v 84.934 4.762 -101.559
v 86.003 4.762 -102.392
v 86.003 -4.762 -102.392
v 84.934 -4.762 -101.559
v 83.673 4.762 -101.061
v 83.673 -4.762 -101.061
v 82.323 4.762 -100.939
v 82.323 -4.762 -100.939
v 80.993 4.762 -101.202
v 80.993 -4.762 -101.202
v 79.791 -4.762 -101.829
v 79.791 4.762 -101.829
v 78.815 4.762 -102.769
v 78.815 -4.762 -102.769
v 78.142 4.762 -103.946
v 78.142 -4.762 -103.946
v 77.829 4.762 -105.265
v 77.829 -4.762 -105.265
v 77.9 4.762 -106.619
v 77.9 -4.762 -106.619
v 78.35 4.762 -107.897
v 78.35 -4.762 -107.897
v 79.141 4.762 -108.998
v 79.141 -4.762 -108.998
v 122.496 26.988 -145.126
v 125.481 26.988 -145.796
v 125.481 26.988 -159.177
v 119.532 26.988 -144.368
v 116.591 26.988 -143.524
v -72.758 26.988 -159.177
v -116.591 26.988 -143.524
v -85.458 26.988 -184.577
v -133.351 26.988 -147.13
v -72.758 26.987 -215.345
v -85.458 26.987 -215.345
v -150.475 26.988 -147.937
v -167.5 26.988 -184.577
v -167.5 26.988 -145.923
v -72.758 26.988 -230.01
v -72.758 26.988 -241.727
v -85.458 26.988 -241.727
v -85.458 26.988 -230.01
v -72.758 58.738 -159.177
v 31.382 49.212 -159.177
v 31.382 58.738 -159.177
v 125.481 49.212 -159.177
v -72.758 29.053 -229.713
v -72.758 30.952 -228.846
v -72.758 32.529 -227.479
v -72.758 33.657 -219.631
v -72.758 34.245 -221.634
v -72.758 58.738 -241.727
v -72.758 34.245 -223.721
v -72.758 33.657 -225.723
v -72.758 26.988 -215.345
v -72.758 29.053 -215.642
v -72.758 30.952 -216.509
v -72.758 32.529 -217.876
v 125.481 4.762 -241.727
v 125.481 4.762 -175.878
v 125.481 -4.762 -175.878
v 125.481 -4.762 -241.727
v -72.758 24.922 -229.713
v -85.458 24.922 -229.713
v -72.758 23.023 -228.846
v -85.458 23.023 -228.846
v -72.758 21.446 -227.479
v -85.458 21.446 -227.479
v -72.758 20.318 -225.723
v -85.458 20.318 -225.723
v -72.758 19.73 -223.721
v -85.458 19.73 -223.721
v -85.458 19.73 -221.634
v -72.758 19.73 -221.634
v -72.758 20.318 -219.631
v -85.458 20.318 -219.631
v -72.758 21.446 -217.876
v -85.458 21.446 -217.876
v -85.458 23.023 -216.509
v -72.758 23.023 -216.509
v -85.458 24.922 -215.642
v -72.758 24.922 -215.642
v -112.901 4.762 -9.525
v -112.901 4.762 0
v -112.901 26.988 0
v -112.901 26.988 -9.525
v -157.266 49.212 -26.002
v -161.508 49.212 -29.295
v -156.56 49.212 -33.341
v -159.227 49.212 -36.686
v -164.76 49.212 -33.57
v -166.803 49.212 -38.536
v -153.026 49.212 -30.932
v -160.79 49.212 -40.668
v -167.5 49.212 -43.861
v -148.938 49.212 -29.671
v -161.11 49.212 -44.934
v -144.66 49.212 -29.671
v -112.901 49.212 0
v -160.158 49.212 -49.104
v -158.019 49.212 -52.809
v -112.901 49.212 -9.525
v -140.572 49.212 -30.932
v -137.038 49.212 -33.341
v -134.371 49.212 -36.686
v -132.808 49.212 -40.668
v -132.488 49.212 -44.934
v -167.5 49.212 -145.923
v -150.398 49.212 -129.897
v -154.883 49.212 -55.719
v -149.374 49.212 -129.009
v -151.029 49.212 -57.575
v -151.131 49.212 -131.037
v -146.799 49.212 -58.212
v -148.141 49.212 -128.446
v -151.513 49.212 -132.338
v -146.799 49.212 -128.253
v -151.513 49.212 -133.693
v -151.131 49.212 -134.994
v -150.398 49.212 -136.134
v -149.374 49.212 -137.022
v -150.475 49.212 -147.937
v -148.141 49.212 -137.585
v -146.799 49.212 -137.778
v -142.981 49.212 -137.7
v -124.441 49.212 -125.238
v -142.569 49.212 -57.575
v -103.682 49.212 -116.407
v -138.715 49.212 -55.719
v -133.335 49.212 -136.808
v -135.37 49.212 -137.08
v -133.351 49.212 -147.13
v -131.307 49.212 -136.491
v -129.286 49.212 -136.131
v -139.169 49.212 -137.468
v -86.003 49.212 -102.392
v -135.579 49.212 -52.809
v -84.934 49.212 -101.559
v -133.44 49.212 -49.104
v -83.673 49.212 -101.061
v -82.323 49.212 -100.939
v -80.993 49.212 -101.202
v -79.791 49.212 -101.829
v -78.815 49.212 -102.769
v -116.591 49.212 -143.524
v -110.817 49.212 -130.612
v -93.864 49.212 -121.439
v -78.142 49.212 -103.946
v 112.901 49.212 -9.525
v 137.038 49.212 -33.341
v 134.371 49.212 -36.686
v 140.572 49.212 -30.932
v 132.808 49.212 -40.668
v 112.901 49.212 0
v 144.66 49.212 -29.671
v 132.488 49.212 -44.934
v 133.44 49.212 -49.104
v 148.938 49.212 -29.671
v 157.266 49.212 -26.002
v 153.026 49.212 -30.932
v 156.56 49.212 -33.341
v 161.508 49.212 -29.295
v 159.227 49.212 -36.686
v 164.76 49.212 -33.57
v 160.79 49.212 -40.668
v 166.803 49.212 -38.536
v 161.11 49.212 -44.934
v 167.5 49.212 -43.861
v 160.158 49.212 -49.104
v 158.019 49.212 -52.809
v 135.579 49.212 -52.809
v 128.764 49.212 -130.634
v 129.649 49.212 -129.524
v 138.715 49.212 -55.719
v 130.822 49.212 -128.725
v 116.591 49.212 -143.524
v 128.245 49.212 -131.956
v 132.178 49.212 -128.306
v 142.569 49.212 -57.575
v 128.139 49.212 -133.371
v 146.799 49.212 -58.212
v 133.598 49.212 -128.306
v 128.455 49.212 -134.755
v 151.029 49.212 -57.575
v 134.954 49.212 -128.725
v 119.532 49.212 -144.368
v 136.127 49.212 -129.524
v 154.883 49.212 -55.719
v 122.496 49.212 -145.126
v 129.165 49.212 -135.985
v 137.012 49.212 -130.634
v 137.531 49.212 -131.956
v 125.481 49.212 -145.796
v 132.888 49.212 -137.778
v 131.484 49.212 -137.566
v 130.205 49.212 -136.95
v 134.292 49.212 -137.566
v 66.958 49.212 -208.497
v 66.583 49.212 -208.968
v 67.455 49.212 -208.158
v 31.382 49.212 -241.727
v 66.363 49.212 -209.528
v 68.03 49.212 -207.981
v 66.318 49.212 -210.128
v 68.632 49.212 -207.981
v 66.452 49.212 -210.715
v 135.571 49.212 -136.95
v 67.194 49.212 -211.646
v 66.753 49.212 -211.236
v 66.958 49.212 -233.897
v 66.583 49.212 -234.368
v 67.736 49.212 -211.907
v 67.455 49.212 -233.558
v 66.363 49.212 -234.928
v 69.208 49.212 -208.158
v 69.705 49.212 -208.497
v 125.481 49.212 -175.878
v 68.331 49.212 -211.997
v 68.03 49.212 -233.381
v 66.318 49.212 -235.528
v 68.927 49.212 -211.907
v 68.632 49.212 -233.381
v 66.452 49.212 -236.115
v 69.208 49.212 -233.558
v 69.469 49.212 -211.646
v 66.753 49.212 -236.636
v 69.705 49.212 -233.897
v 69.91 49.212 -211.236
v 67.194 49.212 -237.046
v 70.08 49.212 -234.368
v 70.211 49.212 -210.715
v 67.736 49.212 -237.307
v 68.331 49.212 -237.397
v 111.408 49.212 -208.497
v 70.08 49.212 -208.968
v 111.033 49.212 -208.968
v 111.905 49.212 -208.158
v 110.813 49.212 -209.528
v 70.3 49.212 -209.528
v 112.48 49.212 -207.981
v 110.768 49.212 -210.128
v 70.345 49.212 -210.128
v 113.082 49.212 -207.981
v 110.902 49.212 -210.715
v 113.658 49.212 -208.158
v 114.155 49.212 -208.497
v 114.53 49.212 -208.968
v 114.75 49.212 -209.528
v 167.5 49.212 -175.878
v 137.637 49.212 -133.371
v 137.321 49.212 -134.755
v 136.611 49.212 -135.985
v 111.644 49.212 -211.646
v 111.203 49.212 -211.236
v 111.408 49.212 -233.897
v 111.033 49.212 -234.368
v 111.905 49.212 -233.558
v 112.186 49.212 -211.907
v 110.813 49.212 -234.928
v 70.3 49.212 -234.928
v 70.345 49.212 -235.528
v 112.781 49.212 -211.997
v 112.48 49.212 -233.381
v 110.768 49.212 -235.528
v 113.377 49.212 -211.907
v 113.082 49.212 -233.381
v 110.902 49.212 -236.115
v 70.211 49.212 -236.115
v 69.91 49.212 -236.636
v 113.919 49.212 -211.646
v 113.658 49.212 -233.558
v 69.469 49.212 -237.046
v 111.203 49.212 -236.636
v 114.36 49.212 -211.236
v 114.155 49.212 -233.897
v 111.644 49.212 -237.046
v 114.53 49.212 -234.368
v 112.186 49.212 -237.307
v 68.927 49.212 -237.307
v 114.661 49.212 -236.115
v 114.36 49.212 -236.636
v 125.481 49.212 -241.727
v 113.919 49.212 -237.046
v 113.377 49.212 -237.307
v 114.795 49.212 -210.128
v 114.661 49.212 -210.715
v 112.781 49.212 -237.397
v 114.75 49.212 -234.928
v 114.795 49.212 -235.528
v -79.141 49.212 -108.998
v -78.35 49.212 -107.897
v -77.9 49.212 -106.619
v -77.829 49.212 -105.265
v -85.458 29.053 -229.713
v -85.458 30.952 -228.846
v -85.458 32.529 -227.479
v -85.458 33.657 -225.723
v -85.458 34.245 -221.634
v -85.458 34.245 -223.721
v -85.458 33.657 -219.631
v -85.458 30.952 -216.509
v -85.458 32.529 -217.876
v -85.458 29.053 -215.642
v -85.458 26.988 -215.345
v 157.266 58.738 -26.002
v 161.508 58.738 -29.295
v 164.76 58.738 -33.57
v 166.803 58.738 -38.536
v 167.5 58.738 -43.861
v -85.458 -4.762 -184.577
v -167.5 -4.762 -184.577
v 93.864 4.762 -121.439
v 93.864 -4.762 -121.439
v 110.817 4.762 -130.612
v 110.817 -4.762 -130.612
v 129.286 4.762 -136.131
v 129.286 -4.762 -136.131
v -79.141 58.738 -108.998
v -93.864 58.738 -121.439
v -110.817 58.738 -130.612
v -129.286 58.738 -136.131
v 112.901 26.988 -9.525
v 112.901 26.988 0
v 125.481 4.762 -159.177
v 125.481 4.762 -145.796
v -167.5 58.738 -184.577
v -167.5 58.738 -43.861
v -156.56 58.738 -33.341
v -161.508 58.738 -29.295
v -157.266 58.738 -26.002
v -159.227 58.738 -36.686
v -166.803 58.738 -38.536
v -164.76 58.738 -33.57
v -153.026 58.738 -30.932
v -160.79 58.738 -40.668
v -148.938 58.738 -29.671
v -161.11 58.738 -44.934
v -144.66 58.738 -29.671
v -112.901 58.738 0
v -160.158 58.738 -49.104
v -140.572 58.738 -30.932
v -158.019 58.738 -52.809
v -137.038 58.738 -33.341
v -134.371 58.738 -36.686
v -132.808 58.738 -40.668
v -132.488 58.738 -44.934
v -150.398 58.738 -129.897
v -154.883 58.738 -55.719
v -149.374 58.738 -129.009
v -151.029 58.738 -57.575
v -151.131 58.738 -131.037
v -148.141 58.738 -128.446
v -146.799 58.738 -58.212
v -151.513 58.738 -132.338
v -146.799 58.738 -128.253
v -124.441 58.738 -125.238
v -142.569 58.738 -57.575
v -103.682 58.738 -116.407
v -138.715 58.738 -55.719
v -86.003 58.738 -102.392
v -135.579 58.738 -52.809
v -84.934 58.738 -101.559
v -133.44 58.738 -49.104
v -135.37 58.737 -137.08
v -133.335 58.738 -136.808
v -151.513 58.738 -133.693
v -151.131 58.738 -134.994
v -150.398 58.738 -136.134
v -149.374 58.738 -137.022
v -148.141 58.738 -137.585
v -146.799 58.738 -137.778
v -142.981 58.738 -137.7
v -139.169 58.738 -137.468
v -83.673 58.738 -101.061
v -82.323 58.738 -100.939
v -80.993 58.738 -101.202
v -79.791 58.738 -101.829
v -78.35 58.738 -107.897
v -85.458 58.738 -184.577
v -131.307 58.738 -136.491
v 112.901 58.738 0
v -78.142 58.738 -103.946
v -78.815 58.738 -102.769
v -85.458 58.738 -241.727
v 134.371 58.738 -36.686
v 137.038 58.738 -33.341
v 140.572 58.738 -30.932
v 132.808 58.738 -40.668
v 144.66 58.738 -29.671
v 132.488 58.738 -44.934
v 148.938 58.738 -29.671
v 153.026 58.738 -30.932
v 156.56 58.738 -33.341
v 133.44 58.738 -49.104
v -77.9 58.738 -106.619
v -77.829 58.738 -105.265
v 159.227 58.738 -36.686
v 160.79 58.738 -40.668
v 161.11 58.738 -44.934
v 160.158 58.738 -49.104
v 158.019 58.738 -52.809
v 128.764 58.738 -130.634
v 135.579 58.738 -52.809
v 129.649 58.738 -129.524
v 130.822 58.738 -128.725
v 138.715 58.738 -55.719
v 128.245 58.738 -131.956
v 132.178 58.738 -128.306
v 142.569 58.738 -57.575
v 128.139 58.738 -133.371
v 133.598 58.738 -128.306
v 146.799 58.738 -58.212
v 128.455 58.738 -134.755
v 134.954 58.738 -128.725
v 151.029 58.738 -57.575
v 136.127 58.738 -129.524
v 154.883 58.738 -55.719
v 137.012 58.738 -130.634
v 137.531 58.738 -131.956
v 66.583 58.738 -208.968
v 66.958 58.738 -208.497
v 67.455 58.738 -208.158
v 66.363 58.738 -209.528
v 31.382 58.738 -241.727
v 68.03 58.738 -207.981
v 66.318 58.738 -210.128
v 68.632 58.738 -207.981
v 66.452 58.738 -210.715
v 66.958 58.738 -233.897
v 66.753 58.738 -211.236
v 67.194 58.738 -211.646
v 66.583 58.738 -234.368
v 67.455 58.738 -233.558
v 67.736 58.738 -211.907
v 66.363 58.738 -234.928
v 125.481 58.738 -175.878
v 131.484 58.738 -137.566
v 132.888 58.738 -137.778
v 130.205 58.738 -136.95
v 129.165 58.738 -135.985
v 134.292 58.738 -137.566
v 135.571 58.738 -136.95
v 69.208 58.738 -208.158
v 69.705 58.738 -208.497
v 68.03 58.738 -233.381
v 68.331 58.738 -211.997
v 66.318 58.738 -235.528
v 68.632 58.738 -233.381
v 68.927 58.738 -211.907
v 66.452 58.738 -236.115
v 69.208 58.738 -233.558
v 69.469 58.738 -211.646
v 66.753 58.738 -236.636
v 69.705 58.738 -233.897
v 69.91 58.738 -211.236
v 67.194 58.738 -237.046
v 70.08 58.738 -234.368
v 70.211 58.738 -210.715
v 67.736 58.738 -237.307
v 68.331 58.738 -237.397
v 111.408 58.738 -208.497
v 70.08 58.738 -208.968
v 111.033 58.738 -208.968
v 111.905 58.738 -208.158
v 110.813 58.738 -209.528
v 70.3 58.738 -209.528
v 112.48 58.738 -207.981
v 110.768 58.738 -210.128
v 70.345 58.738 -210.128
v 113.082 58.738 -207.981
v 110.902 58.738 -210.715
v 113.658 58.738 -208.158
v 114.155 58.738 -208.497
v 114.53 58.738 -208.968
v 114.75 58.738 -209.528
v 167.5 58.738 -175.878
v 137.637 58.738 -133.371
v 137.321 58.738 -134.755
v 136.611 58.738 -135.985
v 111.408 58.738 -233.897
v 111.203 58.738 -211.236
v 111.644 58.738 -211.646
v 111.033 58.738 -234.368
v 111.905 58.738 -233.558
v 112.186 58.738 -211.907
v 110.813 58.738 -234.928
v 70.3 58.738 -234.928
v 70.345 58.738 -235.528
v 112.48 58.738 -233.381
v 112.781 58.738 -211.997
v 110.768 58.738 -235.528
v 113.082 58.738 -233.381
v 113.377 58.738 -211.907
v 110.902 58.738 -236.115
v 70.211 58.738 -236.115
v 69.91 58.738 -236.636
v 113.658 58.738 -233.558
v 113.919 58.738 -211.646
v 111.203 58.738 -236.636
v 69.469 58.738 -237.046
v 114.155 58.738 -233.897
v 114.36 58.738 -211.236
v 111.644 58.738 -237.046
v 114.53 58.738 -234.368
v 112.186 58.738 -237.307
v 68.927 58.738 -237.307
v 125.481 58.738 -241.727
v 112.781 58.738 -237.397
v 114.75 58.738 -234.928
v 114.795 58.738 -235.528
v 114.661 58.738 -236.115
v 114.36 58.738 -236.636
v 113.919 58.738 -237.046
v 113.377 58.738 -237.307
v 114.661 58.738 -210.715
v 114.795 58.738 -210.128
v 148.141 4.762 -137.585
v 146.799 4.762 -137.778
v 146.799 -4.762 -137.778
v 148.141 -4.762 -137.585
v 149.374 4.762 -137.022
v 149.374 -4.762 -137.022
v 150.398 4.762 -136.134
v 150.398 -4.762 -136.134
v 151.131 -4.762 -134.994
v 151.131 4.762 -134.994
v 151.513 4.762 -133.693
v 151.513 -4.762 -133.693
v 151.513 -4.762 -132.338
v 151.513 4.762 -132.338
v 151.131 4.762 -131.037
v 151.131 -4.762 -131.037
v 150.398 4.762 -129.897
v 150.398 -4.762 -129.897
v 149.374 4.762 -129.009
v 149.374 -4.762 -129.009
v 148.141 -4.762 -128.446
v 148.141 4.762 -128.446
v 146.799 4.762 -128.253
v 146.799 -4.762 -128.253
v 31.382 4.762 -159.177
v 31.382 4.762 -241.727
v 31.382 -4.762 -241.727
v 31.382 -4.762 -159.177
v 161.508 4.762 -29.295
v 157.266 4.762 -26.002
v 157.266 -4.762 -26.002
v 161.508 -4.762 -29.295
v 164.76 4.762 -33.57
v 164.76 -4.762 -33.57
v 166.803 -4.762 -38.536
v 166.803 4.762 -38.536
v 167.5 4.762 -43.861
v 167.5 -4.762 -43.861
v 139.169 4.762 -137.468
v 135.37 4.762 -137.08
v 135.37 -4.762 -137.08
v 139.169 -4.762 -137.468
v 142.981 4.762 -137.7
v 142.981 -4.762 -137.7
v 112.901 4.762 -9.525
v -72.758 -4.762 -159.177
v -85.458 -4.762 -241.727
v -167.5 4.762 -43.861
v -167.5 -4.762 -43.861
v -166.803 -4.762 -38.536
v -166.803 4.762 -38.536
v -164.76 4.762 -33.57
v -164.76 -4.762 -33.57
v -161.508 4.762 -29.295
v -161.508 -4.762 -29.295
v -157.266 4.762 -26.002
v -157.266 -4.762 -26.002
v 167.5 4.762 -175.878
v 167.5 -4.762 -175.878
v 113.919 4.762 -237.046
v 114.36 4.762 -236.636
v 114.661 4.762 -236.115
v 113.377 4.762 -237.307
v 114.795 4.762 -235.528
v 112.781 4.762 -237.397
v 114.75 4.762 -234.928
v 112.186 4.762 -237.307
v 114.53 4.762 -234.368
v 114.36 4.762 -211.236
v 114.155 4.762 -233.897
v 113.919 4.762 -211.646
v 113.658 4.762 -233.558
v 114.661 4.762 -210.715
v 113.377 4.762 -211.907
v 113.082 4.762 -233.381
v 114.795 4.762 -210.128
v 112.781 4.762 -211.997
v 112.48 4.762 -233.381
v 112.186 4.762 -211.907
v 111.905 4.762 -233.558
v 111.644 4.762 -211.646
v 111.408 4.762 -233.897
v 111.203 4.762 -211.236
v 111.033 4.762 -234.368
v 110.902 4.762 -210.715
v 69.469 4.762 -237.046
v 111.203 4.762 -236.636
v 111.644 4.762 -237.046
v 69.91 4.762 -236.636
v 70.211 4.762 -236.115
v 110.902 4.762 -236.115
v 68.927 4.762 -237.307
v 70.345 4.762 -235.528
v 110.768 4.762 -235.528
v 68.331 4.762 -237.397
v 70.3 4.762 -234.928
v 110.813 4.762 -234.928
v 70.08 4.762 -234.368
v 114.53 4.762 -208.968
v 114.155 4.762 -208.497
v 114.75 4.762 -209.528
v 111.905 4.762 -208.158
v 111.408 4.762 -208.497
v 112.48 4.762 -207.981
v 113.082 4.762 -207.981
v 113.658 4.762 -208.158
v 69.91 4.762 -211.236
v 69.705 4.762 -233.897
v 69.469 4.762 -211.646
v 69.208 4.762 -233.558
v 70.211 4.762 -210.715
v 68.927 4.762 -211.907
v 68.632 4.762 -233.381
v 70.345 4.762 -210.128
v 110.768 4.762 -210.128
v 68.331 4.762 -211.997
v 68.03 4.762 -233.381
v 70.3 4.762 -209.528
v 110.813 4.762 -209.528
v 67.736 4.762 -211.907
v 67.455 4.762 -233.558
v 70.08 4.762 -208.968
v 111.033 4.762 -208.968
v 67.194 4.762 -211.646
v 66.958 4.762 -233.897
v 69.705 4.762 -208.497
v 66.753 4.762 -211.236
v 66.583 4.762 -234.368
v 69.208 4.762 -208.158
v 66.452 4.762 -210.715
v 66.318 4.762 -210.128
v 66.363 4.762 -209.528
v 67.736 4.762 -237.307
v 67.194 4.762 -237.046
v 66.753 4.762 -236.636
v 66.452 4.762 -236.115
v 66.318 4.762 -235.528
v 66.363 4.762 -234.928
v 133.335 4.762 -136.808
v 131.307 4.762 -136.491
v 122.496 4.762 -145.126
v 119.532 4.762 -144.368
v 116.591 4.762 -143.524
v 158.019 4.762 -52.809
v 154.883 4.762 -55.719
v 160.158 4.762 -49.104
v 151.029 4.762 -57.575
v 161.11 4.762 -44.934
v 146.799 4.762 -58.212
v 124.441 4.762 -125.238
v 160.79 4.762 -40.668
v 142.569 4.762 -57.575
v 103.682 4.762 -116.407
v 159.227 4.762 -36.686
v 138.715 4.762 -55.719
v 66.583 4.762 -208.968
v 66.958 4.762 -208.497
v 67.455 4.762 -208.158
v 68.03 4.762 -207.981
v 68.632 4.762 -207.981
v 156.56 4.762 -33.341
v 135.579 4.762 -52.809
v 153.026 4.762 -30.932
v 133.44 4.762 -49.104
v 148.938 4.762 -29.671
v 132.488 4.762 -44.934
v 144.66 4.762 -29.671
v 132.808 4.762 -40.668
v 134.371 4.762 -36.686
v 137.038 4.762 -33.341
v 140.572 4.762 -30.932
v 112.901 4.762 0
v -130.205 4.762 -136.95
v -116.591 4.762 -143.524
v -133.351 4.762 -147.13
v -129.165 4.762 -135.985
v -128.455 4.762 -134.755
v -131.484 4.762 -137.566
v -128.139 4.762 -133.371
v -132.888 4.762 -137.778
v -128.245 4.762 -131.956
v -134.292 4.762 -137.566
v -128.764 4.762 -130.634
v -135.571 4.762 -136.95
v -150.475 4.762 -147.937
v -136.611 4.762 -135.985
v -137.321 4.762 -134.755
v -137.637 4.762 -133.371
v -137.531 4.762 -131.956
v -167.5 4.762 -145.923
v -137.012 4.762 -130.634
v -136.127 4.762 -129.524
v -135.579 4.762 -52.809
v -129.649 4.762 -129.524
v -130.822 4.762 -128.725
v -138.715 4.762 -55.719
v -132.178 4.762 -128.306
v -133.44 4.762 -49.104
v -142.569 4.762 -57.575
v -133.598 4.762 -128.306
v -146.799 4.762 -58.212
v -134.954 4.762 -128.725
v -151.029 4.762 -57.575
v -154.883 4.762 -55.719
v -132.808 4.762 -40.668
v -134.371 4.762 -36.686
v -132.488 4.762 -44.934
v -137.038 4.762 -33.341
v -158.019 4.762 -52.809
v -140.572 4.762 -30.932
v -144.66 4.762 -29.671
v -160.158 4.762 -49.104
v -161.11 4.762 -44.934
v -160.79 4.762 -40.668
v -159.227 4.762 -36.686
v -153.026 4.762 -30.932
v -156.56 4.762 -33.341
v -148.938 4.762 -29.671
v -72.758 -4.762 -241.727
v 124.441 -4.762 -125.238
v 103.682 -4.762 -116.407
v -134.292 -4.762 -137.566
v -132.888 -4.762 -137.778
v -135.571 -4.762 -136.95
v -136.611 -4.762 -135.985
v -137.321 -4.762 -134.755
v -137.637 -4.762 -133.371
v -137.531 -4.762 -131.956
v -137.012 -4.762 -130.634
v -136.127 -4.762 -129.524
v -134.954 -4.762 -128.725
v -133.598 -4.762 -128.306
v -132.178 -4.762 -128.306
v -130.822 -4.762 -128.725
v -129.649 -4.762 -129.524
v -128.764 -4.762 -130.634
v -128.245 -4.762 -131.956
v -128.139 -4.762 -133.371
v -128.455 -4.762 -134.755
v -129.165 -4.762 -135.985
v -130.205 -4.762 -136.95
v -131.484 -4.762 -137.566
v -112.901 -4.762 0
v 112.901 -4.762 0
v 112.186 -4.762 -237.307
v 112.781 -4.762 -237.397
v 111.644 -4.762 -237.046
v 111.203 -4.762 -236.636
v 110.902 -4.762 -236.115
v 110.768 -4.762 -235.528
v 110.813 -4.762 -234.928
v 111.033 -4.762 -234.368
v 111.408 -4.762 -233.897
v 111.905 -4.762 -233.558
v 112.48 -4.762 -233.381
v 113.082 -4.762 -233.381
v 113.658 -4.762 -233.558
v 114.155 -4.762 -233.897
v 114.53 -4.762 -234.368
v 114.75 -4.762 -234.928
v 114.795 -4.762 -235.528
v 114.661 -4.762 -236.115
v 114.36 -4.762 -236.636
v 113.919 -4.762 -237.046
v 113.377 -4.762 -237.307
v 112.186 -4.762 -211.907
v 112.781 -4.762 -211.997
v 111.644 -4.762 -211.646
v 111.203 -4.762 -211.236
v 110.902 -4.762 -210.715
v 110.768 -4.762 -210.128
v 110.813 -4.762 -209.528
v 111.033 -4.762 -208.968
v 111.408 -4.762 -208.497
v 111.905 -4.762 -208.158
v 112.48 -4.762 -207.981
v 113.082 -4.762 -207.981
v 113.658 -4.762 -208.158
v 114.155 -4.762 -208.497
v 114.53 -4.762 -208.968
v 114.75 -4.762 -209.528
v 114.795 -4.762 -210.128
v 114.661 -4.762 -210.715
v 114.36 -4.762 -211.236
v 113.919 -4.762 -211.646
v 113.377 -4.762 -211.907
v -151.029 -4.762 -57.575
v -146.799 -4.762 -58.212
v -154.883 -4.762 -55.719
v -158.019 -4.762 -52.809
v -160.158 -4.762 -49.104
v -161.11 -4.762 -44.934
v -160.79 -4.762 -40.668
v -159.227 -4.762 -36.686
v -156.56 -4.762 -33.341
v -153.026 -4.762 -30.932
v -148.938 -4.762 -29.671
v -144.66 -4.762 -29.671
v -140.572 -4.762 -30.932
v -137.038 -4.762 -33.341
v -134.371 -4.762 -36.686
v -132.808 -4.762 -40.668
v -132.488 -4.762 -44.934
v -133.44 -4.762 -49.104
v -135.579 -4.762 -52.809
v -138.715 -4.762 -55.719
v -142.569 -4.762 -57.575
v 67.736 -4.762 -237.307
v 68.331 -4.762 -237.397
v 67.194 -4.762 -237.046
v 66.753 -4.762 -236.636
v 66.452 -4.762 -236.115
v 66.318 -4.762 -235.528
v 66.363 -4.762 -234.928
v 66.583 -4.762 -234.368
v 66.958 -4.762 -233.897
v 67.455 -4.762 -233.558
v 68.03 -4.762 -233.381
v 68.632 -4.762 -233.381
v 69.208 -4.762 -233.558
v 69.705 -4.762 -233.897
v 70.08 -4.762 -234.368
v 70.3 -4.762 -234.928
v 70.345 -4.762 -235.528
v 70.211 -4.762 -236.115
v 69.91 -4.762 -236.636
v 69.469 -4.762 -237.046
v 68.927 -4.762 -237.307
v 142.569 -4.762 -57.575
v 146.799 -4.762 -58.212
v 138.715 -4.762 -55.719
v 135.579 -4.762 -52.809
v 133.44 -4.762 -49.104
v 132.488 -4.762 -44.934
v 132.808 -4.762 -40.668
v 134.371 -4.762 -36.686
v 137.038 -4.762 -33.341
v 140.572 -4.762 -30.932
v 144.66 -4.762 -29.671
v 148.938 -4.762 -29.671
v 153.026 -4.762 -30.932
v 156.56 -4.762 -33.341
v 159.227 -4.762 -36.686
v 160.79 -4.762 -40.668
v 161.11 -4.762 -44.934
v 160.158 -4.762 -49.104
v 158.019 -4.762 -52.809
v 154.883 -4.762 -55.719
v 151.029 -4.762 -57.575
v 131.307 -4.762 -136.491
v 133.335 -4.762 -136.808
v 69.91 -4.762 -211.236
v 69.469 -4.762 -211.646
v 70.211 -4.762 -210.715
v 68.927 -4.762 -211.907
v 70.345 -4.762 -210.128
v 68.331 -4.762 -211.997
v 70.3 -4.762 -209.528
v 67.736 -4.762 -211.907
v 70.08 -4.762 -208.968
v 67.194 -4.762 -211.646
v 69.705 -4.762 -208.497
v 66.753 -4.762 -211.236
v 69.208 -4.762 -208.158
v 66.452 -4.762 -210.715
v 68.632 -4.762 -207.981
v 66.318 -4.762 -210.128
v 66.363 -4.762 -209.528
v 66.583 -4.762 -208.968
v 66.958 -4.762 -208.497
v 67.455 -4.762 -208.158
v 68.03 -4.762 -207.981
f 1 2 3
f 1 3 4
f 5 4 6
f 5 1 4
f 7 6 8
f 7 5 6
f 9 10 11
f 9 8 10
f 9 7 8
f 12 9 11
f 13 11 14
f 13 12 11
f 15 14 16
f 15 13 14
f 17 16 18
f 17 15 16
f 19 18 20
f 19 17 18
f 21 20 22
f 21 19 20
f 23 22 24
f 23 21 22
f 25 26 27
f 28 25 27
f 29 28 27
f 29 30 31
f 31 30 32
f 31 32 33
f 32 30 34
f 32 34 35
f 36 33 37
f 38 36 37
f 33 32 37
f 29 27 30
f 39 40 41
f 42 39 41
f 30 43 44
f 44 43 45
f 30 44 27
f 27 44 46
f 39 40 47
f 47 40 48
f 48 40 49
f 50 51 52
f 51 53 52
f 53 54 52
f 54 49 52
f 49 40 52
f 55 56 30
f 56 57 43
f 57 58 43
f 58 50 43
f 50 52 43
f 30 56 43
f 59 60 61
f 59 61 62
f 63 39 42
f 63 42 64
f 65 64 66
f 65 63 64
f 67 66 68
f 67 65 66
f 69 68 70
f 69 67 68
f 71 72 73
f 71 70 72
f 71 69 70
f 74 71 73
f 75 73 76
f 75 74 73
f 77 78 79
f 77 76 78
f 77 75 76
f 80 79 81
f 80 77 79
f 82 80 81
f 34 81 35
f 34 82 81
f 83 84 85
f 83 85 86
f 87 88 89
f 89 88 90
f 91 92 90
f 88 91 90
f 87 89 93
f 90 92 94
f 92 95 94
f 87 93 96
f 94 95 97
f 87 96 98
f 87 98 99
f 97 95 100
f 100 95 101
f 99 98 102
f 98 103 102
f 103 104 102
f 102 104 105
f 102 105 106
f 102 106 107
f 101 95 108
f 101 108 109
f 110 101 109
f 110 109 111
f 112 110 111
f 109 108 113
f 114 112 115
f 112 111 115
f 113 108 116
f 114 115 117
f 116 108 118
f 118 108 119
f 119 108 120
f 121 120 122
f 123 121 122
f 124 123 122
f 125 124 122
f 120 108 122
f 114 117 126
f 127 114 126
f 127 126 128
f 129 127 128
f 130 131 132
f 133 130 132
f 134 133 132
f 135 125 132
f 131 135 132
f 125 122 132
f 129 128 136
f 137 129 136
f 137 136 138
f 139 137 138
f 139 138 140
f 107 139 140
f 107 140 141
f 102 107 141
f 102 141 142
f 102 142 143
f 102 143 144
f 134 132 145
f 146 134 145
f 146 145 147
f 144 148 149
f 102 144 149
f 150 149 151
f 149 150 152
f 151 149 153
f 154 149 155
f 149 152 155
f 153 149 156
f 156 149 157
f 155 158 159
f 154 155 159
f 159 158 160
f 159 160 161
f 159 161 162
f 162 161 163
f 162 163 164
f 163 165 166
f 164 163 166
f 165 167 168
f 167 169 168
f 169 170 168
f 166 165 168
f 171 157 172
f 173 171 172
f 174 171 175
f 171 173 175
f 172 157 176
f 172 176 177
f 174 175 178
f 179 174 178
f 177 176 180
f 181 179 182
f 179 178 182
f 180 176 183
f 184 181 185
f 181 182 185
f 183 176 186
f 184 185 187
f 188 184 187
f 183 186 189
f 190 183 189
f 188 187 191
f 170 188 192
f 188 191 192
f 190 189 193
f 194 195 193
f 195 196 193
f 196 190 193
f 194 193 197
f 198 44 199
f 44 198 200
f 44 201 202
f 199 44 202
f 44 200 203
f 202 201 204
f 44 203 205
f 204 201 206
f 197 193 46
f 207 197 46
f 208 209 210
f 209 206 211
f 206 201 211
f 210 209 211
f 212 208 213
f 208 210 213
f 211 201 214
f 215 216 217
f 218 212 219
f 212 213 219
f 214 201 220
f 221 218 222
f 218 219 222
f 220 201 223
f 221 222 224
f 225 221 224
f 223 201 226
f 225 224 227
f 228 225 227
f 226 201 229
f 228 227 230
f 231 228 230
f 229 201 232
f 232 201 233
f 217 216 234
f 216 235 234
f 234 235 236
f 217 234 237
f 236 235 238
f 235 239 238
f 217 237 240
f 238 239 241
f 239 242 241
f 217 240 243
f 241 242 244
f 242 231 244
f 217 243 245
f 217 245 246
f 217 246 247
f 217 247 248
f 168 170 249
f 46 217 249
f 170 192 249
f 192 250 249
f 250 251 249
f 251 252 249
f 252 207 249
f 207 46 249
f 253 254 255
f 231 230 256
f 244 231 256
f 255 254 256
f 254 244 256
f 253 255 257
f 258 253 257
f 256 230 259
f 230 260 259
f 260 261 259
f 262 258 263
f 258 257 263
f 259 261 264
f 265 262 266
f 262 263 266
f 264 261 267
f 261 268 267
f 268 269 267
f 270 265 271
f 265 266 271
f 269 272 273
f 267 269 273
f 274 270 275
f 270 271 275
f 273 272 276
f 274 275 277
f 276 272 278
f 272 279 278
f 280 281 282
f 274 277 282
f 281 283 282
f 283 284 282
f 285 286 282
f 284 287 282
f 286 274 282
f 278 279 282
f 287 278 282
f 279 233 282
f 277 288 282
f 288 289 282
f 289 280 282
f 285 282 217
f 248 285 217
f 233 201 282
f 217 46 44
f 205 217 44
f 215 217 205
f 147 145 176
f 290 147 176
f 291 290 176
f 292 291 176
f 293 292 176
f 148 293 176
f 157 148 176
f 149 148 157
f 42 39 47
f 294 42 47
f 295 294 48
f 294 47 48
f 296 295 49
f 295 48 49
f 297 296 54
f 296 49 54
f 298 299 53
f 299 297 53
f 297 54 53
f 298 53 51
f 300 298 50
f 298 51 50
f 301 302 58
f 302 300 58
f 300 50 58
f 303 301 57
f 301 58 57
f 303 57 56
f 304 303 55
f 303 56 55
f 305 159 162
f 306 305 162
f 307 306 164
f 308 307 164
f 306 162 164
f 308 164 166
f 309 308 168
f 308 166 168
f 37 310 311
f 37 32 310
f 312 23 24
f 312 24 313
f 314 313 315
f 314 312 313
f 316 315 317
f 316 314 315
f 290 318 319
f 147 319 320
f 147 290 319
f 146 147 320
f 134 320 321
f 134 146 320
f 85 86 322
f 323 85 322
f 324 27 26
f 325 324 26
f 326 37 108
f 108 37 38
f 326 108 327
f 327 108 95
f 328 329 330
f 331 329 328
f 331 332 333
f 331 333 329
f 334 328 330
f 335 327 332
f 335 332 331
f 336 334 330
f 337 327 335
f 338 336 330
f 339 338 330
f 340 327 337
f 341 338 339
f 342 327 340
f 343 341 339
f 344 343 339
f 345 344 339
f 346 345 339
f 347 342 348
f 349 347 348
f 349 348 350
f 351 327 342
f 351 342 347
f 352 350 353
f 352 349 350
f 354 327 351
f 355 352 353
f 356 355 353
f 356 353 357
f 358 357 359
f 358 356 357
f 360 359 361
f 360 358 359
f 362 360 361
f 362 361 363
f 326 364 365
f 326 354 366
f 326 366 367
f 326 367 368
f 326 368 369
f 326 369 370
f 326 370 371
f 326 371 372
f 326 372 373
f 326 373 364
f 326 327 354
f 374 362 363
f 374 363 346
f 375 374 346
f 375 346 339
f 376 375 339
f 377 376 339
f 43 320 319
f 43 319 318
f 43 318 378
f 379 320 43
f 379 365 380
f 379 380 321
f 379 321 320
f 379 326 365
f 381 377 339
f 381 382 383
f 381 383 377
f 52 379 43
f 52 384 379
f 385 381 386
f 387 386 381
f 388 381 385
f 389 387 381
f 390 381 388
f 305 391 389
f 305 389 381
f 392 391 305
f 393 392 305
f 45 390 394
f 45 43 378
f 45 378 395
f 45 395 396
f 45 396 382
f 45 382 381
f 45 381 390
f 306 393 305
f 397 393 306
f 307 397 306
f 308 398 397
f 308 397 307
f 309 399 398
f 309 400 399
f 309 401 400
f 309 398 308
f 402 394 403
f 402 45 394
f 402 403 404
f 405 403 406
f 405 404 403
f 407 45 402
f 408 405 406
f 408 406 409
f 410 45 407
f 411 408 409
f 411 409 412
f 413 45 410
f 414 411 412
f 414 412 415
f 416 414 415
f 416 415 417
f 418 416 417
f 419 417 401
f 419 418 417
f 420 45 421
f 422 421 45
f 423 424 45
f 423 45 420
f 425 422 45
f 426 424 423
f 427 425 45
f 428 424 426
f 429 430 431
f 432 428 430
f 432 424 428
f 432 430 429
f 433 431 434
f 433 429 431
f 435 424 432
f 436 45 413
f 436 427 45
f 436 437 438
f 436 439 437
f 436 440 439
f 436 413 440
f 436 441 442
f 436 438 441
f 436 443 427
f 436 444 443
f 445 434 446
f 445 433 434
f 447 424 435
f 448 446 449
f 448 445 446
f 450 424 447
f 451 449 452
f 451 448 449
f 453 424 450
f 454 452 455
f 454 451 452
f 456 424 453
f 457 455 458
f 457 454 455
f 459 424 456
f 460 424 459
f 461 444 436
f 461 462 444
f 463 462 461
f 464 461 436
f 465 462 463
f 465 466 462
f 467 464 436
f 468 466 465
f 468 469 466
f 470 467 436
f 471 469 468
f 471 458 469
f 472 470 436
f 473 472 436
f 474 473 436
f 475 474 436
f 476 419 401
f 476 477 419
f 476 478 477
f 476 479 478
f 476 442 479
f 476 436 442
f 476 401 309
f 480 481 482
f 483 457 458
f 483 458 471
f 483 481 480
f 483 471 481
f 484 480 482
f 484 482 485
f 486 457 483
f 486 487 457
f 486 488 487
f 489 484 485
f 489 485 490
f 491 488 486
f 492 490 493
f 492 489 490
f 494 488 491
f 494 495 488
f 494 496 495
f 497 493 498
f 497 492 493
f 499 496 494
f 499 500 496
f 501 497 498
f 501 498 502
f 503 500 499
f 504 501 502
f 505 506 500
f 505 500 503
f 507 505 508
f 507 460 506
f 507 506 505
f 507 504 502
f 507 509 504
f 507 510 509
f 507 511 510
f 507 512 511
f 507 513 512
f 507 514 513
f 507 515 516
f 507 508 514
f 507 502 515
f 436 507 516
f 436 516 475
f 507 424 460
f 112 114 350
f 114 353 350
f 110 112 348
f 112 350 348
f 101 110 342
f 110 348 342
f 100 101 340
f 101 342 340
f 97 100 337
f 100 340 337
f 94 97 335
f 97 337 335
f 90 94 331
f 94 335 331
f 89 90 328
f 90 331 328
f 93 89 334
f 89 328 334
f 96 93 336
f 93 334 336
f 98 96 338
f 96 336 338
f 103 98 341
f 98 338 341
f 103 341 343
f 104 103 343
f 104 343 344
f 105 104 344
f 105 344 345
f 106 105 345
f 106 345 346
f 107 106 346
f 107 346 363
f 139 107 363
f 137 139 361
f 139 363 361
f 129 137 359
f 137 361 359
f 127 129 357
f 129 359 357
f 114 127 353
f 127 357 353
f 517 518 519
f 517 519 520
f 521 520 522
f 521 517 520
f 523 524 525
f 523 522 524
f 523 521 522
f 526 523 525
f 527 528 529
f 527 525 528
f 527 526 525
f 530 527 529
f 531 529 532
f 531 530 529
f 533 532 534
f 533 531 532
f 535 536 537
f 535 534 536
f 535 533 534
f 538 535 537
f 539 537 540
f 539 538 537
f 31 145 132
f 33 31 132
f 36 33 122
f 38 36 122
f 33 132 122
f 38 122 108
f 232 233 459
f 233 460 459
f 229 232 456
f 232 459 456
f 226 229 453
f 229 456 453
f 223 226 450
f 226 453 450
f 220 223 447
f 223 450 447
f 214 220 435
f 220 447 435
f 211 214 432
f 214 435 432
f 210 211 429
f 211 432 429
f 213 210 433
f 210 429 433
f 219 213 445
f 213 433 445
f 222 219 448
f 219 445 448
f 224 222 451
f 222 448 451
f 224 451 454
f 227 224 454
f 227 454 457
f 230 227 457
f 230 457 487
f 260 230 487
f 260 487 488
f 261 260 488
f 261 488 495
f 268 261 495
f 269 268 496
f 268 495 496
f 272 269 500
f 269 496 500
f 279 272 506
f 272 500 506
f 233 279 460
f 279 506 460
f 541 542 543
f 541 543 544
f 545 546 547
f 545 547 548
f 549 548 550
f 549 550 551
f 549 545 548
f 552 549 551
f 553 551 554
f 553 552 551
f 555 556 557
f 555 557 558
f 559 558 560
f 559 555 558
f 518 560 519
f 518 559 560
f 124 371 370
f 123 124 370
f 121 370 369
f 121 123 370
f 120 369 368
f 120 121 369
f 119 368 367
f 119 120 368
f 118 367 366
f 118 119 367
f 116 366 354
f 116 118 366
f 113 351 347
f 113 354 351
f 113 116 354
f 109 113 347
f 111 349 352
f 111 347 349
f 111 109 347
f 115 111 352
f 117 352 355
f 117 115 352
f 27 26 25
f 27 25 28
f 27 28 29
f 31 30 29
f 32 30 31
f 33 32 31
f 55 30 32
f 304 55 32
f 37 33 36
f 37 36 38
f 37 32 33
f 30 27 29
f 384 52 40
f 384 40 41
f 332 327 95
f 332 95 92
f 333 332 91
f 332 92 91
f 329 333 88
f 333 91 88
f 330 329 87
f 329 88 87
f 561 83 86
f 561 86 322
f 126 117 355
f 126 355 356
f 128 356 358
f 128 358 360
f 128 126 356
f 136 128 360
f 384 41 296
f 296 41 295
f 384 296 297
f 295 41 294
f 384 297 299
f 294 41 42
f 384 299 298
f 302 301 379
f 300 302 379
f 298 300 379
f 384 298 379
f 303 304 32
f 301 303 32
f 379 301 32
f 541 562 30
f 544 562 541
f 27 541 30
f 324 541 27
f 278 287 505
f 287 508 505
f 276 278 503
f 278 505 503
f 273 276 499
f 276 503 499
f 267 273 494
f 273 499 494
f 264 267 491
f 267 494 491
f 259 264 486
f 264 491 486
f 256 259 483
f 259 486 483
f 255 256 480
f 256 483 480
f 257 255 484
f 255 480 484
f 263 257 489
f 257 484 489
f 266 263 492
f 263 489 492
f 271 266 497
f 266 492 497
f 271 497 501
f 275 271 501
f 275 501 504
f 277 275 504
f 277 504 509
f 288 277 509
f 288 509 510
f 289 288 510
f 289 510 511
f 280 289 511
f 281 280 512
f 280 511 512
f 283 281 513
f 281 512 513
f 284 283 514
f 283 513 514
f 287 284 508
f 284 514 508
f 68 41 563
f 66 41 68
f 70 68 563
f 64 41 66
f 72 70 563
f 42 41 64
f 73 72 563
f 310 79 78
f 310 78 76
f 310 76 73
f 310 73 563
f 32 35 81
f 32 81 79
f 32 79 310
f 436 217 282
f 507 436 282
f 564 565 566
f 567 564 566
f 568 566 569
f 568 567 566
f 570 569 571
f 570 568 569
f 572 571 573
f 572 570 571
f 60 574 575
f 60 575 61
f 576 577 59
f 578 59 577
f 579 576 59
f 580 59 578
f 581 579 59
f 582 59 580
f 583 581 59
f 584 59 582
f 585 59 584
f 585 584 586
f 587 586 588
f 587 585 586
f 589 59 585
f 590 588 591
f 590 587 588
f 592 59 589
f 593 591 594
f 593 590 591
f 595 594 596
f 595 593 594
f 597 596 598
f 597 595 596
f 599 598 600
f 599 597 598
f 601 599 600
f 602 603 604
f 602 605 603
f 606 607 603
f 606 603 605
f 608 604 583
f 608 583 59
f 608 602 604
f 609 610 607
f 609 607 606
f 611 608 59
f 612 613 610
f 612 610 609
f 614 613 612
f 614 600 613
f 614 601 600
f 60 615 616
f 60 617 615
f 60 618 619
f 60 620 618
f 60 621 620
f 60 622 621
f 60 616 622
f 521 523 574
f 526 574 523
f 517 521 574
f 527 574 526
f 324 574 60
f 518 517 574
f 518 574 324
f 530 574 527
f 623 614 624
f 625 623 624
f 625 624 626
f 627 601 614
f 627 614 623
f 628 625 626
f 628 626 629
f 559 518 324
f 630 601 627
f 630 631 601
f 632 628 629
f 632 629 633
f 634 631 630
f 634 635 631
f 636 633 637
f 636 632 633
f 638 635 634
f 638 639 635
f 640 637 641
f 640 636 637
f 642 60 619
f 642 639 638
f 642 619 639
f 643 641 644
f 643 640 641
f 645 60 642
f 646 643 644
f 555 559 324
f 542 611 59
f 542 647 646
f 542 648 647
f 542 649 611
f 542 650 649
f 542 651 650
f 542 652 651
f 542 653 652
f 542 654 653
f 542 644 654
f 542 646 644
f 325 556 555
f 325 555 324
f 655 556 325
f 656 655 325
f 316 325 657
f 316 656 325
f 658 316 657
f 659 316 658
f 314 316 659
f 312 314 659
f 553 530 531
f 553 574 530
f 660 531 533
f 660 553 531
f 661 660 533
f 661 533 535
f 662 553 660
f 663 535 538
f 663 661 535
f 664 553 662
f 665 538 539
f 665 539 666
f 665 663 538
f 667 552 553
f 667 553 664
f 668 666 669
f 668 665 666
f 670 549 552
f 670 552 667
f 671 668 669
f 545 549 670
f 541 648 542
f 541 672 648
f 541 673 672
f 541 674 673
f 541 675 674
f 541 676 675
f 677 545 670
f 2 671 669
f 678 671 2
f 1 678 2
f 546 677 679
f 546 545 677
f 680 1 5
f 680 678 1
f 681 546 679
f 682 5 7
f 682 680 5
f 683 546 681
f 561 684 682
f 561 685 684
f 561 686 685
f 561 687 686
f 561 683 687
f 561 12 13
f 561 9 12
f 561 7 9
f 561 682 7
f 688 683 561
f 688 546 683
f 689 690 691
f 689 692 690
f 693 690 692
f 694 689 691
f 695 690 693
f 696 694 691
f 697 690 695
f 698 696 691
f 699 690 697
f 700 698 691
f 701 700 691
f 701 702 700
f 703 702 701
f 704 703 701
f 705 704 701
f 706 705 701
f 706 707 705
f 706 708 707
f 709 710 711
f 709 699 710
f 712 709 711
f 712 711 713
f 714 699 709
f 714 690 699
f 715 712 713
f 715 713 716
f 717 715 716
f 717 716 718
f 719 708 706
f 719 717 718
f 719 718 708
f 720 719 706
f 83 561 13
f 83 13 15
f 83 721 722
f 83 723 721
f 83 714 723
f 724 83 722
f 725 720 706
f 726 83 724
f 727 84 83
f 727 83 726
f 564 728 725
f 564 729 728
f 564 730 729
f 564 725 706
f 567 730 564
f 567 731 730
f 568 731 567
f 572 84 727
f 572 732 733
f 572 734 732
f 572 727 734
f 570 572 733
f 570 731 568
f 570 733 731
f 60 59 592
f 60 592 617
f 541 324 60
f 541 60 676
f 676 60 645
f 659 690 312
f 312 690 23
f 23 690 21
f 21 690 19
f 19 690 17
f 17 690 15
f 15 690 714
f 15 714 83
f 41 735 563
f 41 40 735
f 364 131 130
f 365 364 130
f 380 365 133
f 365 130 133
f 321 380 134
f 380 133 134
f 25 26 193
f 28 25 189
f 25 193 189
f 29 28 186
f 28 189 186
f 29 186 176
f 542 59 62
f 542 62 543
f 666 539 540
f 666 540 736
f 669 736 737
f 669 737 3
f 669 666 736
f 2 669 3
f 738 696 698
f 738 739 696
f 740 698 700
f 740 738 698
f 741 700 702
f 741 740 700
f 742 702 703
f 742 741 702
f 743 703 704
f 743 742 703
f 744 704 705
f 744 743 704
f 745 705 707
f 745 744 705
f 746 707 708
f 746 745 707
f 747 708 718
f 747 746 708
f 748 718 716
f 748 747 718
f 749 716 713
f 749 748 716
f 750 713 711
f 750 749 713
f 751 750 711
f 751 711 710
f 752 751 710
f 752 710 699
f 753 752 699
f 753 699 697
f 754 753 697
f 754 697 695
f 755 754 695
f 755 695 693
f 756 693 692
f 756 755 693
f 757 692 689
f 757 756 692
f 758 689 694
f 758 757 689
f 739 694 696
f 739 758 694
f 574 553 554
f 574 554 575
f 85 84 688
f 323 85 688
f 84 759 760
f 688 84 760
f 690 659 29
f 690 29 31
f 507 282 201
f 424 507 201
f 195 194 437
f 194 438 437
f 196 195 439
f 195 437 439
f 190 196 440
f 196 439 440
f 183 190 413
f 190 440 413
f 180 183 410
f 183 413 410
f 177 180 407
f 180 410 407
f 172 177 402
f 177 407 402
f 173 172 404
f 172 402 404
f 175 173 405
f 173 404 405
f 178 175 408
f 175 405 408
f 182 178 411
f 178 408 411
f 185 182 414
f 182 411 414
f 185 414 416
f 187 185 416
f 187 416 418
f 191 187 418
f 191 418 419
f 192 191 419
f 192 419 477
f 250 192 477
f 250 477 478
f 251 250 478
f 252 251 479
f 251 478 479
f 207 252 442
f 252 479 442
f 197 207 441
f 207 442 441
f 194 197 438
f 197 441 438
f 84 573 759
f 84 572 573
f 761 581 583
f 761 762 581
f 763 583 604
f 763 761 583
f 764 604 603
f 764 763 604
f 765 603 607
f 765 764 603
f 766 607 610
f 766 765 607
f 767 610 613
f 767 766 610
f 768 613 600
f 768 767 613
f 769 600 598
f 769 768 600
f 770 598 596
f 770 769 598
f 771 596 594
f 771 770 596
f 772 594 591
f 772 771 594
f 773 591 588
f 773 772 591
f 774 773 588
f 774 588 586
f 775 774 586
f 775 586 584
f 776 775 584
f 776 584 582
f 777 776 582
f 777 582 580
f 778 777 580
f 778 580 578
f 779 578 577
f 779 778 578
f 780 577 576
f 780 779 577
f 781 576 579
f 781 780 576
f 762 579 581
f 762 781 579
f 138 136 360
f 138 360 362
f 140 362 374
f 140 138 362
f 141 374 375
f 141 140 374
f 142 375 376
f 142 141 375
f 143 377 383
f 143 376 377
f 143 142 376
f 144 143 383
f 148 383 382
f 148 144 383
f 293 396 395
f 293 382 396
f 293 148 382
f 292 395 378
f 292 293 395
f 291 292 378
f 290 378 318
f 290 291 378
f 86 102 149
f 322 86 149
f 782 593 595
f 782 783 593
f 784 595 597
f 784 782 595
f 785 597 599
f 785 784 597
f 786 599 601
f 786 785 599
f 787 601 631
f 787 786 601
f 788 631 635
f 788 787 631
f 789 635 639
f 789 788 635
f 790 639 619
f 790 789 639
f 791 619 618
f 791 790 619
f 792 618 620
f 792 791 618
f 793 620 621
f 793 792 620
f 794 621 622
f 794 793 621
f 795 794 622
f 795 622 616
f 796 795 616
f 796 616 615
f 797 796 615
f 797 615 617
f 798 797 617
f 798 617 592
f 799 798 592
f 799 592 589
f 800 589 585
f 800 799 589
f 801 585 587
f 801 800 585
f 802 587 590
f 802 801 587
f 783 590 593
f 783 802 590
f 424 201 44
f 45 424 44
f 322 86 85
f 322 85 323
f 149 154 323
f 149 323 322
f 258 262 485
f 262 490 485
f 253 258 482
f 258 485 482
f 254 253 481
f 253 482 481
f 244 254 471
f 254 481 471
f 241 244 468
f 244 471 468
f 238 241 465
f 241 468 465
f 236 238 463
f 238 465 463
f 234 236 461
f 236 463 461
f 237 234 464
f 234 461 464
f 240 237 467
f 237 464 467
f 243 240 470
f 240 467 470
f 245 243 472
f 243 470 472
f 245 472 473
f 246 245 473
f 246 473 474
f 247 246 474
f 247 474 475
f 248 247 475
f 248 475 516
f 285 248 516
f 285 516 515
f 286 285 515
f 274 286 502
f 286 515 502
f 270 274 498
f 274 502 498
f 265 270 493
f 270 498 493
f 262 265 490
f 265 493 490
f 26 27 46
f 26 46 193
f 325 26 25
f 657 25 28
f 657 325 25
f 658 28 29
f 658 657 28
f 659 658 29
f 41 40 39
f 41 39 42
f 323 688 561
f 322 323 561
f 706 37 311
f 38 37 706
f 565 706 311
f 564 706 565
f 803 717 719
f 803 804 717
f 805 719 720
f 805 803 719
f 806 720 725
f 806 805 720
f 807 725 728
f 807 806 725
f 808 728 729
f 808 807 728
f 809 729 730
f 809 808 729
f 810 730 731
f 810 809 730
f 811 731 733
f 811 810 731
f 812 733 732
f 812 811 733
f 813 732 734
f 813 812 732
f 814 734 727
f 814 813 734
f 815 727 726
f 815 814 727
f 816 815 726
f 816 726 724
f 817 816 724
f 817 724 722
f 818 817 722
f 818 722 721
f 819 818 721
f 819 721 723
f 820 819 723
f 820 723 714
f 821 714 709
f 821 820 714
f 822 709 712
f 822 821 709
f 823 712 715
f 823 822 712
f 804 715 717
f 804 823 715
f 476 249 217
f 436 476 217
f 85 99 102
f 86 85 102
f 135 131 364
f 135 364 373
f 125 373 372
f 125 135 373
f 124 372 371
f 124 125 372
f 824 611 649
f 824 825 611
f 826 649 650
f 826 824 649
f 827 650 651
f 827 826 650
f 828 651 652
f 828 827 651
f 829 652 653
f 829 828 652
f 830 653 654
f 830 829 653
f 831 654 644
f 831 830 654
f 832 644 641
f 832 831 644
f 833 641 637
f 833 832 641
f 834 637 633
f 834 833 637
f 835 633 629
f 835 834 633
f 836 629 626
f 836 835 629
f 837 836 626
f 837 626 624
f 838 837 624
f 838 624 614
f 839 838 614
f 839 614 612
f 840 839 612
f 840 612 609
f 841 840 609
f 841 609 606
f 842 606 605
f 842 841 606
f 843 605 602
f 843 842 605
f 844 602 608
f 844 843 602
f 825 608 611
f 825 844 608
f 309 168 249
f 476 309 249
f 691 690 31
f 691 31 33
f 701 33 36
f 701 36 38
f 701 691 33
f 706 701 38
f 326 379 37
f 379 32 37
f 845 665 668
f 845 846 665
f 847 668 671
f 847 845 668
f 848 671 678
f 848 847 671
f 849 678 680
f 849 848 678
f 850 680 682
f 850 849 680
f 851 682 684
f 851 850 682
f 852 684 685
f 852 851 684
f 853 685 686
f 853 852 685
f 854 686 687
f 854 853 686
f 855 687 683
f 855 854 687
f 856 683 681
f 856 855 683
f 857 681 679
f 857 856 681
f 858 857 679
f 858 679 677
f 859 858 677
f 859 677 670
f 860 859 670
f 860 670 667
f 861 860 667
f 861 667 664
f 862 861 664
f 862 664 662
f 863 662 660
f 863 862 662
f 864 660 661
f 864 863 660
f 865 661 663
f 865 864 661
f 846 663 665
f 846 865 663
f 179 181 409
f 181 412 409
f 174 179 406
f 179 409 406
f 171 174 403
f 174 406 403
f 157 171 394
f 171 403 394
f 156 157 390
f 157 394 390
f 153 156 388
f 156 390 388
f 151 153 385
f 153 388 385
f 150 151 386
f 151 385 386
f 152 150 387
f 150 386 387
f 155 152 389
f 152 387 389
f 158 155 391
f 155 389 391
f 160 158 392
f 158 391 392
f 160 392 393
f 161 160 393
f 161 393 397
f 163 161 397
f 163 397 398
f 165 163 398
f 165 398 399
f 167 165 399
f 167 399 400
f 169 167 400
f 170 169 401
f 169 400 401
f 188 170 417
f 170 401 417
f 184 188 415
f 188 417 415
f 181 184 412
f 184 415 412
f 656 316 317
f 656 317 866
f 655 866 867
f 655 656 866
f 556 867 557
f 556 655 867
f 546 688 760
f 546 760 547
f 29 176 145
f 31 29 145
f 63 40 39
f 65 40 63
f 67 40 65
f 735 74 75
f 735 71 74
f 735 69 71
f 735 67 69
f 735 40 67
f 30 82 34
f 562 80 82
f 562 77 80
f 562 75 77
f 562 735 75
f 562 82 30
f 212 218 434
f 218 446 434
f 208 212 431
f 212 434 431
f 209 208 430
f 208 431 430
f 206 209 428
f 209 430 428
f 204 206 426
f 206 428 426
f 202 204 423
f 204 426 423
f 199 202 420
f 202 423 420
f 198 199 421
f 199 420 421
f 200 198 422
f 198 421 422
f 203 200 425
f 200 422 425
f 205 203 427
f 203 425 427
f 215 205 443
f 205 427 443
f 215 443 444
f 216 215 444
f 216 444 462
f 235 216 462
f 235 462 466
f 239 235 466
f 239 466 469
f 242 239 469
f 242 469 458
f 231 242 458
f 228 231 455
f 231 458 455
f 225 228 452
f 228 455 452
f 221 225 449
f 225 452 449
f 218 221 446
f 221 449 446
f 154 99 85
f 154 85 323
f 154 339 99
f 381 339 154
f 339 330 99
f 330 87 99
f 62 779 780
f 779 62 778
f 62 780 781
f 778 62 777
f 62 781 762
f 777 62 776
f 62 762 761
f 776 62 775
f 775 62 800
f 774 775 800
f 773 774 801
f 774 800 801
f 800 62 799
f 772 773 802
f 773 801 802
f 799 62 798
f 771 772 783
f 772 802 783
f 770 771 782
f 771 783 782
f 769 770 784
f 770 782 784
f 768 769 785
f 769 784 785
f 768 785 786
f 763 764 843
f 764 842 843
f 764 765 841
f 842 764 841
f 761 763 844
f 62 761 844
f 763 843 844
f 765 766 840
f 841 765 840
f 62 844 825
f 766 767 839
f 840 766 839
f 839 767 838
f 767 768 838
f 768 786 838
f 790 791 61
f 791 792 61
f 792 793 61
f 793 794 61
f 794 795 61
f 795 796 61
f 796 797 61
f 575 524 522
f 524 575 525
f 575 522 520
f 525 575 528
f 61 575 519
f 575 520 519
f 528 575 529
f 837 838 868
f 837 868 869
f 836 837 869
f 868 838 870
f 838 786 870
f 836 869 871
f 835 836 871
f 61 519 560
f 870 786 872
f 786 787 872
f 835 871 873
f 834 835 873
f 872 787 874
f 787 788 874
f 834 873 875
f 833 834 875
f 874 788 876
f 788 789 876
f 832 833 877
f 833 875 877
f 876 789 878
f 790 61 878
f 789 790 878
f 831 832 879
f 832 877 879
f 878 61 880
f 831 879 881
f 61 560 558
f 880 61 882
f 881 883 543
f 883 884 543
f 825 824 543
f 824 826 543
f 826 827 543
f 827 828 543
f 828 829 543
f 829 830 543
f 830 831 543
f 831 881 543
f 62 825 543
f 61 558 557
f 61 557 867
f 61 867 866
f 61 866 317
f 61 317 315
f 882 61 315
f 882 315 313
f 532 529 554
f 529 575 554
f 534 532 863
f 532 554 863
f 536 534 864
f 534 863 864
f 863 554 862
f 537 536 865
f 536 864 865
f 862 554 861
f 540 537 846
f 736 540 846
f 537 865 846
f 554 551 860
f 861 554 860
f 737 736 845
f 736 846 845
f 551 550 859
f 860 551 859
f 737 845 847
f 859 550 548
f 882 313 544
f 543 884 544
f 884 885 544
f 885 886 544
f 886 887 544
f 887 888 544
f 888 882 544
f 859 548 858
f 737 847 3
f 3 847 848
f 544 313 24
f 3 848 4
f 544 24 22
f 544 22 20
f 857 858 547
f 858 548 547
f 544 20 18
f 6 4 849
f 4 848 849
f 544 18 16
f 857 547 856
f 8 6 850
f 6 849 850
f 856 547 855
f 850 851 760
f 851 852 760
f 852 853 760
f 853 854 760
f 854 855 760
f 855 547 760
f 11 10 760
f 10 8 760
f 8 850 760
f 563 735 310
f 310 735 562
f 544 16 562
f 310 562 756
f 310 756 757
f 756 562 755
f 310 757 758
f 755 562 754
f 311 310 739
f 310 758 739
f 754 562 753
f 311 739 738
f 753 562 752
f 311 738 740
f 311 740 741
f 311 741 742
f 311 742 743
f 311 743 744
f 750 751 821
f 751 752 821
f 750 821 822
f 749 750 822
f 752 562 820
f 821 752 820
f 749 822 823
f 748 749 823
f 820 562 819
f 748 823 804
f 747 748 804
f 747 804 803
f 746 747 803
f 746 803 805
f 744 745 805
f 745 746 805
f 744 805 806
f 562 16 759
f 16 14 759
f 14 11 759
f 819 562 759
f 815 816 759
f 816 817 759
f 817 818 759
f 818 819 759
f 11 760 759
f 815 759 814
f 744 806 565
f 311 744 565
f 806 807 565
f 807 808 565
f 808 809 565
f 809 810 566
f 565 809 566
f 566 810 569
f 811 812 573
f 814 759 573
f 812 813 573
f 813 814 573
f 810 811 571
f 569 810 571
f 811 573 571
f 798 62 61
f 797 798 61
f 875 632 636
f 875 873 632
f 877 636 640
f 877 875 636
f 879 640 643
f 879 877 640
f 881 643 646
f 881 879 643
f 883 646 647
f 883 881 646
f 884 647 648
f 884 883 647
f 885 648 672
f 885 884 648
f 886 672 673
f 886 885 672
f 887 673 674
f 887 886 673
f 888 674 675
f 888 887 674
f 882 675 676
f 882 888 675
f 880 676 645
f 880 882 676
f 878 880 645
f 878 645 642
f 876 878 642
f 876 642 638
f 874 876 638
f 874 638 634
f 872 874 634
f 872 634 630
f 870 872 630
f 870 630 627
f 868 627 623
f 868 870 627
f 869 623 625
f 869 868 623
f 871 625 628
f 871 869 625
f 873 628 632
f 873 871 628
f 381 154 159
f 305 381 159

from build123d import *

# Parameters (mm, degrees)
SKETCH1_R           = 14.351
SKETCH1_R_2         = 4.7625
SKETCH1_R_3         = 2.0193
BOSS_EXTRUDE1_DEPTH = 4.7625
SKETCH6_W           = 225.801671476
SKETCH6_H           = 9.525
BOSS_EXTRUDE3_DEPTH = 22.225
CUT_EXTRUDE1_DEPTH  = 167.5
CUT_EXTRUDE3_DEPTH  = 296.798040186
CUT_EXTRUDE8_DEPTH  = 296.798040186
BOSS_EXTRUDE4_START = -9.525
BOSS_EXTRUDE4_DEPTH = 9.525
BOSS_EXTRUDE5_START = -9.525
BOSS_EXTRUDE5_DEPTH = 9.525


with BuildPart() as part:
    # Sketch1 → Boss-Extrude1 (new, symmetric)
    with BuildSketch(Plane(origin=(0, 0, 0), x_dir=(1, 0, 0), z_dir=(0, 1, 0))):
        with BuildLine():
            Line((-112.900835738, 0), (112.900835738, 0))
            Line((112.900835738, 0), (157.266244694, 26.001785981))
            ThreePointArc((157.266244694, 26.001785981), (164.760261557, 33.569504415), (167.5, 43.861466536))
            Line((167.5, 43.861466536), (167.5, 175.877966536))
            Line((167.5, 175.877966536), (125.48138, 175.877966536))
            Line((125.48138, 175.877966536), (125.48138, 241.727466536))
            Line((125.48138, 241.727466536), (31.382, 241.727466536))
            Line((31.382, 241.727466536), (31.382, 159.177466536))
            Line((31.382, 159.177466536), (-72.758, 159.177466536))
            Line((-72.758, 159.177466536), (-72.758, 241.727466536))
            Line((-72.758, 241.727466536), (-85.458, 241.727466536))
            Line((-85.458, 241.727466536), (-85.458, 184.577466536))
            Line((-85.458, 184.577466536), (-167.5, 184.577466536))
            Line((-167.5, 184.577466536), (-167.5, 43.861466536))
            ThreePointArc((-167.5, 43.861466536), (-164.760261557, 33.569504415), (-157.266244694, 26.001785981))
            Line((-157.266244694, 26.001785981), (-112.900835738, 0))
        make_face()
        with Locations(Location((146.799, 43.861466536, 0), (0, 0, 90))):
            Circle(SKETCH1_R, mode=Mode.SUBTRACT)
        with Locations(Location((-132.88802, 133.015466536, 0), (0, 0, 90))):
            Circle(SKETCH1_R_2, mode=Mode.SUBTRACT)
        with Locations(Location((-146.799, 43.861466536, 0), (0, 0, 90))):
            Circle(SKETCH1_R, mode=Mode.SUBTRACT)
        with Locations(Location((132.88802, 133.015466536, 0), (0, 0, 90))):
            Circle(SKETCH1_R_2, mode=Mode.SUBTRACT)
        with Locations(Location((112.78138, 235.377466536, 0), (0, 0, 90))):
            Circle(SKETCH1_R_3, mode=Mode.SUBTRACT)
        with Locations(Location((112.78138, 209.977466536, 0), (0, 0, 90))):
            Circle(SKETCH1_R_3, mode=Mode.SUBTRACT)
        with Locations(Location((68.33138, 209.977466536, 0), (0, 0, 90))):
            Circle(SKETCH1_R_3, mode=Mode.SUBTRACT)
        with Locations(Location((68.33138, 235.377466536, 0), (0, 0, 90))):
            Circle(SKETCH1_R_3, mode=Mode.SUBTRACT)
    extrude(amount=BOSS_EXTRUDE1_DEPTH, both=True)

    # Sketch6 → Boss-Extrude3 (add)
    with BuildSketch(Plane(origin=(0, 4.7625, 0), x_dir=(1, 0, 0), z_dir=(0, 1, 0))):
        with Locations((0, 4.7625)):
            Rectangle(SKETCH6_W, SKETCH6_H)
        with BuildLine():
            Line((-72.758, 159.177466536), (125.48138, 159.177466536))
            Line((125.48138, 159.177466536), (125.48138, 145.796243121))
            ThreePointArc((125.48138, 145.796243121), (121.011342976, 144.758128251), (116.59138, 143.524093904))
            Line((116.59138, 143.524093904), (-116.59138, 143.524093904))
            ThreePointArc((-116.59138, 143.524093904), (-141.896659058, 147.886014856), (-167.5, 145.92325272))
            Line((-167.5, 145.92325272), (-167.5, 184.577466536))
            Line((-167.5, 184.577466536), (-85.458, 184.577466536))
            Line((-85.458, 184.577466536), (-85.458, 241.727466536))
            Line((-85.458, 241.727466536), (-72.758, 241.727466536))
            Line((-72.758, 241.727466536), (-72.758, 159.177466536))
        make_face()
    extrude(amount=BOSS_EXTRUDE3_DEPTH)

    # Sketch5 → Cut-Extrude1 (cut)
    with BuildSketch(Plane(origin=(0, 0, 0), x_dir=(0, 0, -1), z_dir=(1, 0, 0))):
        with BuildLine():
            Line((215.345118117, 26.9875), (230.009814955, 26.9875))
            ThreePointArc((230.009814955, 26.9875), (222.677466536, 19.655151581), (215.345118117, 26.9875))
        make_face()
    extrude(amount=-CUT_EXTRUDE1_DEPTH, mode=Mode.SUBTRACT)


with BuildPart() as body_2:
    # Mirror3: mirrored copy
    add(part.part.mirror(Plane(origin=(-146.799, 26.9875, -43.861466536), x_dir=(0, 0, 1), z_dir=(0, 1, 0))))

    # Sketch7<5> → Cut-Extrude8 (cut, through all)
    with BuildSketch(Plane(origin=(0, 26.9875, 0), x_dir=(1, 0, 0), z_dir=(0, 1, 0))):
        with BuildLine():
            ThreePointArc((-79.1413454, 108.997867621), (-110.036749255, 130.283951413), (-146.799, 137.777966536))
            ThreePointArc((-146.799, 137.777966536), (-151.5615, 133.015466536), (-146.799, 128.252966536))
            ThreePointArc((-146.799, 128.252966536), (-113.765172251, 121.518993515), (-86.003176496, 102.39174175))
            ThreePointArc((-86.003176496, 102.39174175), (-79.269198013, 102.263889138), (-79.1413454, 108.997867621))
        make_face()
    extrude(amount=CUT_EXTRUDE8_DEPTH, mode=Mode.SUBTRACT)

    # Sketch9 → Boss-Extrude5 (add)
    with BuildSketch(Plane(origin=(0, 58.7375, 0), x_dir=(1, 0, 0), z_dir=(0, 1, 0)).offset(BOSS_EXTRUDE5_START)):
        with BuildLine():
            ThreePointArc((-135.37018458, 137.079979452), (-132.320106249, 136.655165719), (-129.285595376, 136.130581795))
            ThreePointArc((-129.285595376, 136.130581795), (-132.153796179, 137.721029375), (-135.37018458, 137.079979452))
        make_face()
    extrude(amount=BOSS_EXTRUDE5_DEPTH)


with BuildPart() as part_1:
    add(part.part)

    # Sketch7 → Cut-Extrude3 (cut, through all)
    with BuildSketch(Plane(origin=(0, 26.9875, 0), x_dir=(1, 0, 0), z_dir=(0, 1, 0))):
        with BuildLine():
            ThreePointArc((79.1413454, 108.997867621), (110.036749255, 130.283951413), (146.799, 137.777966536))
            ThreePointArc((146.799, 137.777966536), (151.5615, 133.015466536), (146.799, 128.252966536))
            ThreePointArc((146.799, 128.252966536), (113.765172251, 121.518993515), (86.003176496, 102.39174175))
            ThreePointArc((86.003176496, 102.39174175), (79.269198013, 102.263889138), (79.1413454, 108.997867621))
        make_face()
    extrude(amount=-CUT_EXTRUDE3_DEPTH, mode=Mode.SUBTRACT)

    # Sketch8 → Boss-Extrude4 (add)
    with BuildSketch(Plane.XZ.offset(4.7625).offset(BOSS_EXTRUDE4_START)):
        with BuildLine():
            ThreePointArc((129.285595376, -136.130581795), (132.320106249, -136.655165719), (135.37018458, -137.079979452))
            ThreePointArc((135.37018458, -137.079979452), (132.153796179, -137.721029375), (129.285595376, -136.130581795))
        make_face()
    extrude(amount=BOSS_EXTRUDE4_DEPTH)


solid = Compound([body_2.part, part_1.part])
